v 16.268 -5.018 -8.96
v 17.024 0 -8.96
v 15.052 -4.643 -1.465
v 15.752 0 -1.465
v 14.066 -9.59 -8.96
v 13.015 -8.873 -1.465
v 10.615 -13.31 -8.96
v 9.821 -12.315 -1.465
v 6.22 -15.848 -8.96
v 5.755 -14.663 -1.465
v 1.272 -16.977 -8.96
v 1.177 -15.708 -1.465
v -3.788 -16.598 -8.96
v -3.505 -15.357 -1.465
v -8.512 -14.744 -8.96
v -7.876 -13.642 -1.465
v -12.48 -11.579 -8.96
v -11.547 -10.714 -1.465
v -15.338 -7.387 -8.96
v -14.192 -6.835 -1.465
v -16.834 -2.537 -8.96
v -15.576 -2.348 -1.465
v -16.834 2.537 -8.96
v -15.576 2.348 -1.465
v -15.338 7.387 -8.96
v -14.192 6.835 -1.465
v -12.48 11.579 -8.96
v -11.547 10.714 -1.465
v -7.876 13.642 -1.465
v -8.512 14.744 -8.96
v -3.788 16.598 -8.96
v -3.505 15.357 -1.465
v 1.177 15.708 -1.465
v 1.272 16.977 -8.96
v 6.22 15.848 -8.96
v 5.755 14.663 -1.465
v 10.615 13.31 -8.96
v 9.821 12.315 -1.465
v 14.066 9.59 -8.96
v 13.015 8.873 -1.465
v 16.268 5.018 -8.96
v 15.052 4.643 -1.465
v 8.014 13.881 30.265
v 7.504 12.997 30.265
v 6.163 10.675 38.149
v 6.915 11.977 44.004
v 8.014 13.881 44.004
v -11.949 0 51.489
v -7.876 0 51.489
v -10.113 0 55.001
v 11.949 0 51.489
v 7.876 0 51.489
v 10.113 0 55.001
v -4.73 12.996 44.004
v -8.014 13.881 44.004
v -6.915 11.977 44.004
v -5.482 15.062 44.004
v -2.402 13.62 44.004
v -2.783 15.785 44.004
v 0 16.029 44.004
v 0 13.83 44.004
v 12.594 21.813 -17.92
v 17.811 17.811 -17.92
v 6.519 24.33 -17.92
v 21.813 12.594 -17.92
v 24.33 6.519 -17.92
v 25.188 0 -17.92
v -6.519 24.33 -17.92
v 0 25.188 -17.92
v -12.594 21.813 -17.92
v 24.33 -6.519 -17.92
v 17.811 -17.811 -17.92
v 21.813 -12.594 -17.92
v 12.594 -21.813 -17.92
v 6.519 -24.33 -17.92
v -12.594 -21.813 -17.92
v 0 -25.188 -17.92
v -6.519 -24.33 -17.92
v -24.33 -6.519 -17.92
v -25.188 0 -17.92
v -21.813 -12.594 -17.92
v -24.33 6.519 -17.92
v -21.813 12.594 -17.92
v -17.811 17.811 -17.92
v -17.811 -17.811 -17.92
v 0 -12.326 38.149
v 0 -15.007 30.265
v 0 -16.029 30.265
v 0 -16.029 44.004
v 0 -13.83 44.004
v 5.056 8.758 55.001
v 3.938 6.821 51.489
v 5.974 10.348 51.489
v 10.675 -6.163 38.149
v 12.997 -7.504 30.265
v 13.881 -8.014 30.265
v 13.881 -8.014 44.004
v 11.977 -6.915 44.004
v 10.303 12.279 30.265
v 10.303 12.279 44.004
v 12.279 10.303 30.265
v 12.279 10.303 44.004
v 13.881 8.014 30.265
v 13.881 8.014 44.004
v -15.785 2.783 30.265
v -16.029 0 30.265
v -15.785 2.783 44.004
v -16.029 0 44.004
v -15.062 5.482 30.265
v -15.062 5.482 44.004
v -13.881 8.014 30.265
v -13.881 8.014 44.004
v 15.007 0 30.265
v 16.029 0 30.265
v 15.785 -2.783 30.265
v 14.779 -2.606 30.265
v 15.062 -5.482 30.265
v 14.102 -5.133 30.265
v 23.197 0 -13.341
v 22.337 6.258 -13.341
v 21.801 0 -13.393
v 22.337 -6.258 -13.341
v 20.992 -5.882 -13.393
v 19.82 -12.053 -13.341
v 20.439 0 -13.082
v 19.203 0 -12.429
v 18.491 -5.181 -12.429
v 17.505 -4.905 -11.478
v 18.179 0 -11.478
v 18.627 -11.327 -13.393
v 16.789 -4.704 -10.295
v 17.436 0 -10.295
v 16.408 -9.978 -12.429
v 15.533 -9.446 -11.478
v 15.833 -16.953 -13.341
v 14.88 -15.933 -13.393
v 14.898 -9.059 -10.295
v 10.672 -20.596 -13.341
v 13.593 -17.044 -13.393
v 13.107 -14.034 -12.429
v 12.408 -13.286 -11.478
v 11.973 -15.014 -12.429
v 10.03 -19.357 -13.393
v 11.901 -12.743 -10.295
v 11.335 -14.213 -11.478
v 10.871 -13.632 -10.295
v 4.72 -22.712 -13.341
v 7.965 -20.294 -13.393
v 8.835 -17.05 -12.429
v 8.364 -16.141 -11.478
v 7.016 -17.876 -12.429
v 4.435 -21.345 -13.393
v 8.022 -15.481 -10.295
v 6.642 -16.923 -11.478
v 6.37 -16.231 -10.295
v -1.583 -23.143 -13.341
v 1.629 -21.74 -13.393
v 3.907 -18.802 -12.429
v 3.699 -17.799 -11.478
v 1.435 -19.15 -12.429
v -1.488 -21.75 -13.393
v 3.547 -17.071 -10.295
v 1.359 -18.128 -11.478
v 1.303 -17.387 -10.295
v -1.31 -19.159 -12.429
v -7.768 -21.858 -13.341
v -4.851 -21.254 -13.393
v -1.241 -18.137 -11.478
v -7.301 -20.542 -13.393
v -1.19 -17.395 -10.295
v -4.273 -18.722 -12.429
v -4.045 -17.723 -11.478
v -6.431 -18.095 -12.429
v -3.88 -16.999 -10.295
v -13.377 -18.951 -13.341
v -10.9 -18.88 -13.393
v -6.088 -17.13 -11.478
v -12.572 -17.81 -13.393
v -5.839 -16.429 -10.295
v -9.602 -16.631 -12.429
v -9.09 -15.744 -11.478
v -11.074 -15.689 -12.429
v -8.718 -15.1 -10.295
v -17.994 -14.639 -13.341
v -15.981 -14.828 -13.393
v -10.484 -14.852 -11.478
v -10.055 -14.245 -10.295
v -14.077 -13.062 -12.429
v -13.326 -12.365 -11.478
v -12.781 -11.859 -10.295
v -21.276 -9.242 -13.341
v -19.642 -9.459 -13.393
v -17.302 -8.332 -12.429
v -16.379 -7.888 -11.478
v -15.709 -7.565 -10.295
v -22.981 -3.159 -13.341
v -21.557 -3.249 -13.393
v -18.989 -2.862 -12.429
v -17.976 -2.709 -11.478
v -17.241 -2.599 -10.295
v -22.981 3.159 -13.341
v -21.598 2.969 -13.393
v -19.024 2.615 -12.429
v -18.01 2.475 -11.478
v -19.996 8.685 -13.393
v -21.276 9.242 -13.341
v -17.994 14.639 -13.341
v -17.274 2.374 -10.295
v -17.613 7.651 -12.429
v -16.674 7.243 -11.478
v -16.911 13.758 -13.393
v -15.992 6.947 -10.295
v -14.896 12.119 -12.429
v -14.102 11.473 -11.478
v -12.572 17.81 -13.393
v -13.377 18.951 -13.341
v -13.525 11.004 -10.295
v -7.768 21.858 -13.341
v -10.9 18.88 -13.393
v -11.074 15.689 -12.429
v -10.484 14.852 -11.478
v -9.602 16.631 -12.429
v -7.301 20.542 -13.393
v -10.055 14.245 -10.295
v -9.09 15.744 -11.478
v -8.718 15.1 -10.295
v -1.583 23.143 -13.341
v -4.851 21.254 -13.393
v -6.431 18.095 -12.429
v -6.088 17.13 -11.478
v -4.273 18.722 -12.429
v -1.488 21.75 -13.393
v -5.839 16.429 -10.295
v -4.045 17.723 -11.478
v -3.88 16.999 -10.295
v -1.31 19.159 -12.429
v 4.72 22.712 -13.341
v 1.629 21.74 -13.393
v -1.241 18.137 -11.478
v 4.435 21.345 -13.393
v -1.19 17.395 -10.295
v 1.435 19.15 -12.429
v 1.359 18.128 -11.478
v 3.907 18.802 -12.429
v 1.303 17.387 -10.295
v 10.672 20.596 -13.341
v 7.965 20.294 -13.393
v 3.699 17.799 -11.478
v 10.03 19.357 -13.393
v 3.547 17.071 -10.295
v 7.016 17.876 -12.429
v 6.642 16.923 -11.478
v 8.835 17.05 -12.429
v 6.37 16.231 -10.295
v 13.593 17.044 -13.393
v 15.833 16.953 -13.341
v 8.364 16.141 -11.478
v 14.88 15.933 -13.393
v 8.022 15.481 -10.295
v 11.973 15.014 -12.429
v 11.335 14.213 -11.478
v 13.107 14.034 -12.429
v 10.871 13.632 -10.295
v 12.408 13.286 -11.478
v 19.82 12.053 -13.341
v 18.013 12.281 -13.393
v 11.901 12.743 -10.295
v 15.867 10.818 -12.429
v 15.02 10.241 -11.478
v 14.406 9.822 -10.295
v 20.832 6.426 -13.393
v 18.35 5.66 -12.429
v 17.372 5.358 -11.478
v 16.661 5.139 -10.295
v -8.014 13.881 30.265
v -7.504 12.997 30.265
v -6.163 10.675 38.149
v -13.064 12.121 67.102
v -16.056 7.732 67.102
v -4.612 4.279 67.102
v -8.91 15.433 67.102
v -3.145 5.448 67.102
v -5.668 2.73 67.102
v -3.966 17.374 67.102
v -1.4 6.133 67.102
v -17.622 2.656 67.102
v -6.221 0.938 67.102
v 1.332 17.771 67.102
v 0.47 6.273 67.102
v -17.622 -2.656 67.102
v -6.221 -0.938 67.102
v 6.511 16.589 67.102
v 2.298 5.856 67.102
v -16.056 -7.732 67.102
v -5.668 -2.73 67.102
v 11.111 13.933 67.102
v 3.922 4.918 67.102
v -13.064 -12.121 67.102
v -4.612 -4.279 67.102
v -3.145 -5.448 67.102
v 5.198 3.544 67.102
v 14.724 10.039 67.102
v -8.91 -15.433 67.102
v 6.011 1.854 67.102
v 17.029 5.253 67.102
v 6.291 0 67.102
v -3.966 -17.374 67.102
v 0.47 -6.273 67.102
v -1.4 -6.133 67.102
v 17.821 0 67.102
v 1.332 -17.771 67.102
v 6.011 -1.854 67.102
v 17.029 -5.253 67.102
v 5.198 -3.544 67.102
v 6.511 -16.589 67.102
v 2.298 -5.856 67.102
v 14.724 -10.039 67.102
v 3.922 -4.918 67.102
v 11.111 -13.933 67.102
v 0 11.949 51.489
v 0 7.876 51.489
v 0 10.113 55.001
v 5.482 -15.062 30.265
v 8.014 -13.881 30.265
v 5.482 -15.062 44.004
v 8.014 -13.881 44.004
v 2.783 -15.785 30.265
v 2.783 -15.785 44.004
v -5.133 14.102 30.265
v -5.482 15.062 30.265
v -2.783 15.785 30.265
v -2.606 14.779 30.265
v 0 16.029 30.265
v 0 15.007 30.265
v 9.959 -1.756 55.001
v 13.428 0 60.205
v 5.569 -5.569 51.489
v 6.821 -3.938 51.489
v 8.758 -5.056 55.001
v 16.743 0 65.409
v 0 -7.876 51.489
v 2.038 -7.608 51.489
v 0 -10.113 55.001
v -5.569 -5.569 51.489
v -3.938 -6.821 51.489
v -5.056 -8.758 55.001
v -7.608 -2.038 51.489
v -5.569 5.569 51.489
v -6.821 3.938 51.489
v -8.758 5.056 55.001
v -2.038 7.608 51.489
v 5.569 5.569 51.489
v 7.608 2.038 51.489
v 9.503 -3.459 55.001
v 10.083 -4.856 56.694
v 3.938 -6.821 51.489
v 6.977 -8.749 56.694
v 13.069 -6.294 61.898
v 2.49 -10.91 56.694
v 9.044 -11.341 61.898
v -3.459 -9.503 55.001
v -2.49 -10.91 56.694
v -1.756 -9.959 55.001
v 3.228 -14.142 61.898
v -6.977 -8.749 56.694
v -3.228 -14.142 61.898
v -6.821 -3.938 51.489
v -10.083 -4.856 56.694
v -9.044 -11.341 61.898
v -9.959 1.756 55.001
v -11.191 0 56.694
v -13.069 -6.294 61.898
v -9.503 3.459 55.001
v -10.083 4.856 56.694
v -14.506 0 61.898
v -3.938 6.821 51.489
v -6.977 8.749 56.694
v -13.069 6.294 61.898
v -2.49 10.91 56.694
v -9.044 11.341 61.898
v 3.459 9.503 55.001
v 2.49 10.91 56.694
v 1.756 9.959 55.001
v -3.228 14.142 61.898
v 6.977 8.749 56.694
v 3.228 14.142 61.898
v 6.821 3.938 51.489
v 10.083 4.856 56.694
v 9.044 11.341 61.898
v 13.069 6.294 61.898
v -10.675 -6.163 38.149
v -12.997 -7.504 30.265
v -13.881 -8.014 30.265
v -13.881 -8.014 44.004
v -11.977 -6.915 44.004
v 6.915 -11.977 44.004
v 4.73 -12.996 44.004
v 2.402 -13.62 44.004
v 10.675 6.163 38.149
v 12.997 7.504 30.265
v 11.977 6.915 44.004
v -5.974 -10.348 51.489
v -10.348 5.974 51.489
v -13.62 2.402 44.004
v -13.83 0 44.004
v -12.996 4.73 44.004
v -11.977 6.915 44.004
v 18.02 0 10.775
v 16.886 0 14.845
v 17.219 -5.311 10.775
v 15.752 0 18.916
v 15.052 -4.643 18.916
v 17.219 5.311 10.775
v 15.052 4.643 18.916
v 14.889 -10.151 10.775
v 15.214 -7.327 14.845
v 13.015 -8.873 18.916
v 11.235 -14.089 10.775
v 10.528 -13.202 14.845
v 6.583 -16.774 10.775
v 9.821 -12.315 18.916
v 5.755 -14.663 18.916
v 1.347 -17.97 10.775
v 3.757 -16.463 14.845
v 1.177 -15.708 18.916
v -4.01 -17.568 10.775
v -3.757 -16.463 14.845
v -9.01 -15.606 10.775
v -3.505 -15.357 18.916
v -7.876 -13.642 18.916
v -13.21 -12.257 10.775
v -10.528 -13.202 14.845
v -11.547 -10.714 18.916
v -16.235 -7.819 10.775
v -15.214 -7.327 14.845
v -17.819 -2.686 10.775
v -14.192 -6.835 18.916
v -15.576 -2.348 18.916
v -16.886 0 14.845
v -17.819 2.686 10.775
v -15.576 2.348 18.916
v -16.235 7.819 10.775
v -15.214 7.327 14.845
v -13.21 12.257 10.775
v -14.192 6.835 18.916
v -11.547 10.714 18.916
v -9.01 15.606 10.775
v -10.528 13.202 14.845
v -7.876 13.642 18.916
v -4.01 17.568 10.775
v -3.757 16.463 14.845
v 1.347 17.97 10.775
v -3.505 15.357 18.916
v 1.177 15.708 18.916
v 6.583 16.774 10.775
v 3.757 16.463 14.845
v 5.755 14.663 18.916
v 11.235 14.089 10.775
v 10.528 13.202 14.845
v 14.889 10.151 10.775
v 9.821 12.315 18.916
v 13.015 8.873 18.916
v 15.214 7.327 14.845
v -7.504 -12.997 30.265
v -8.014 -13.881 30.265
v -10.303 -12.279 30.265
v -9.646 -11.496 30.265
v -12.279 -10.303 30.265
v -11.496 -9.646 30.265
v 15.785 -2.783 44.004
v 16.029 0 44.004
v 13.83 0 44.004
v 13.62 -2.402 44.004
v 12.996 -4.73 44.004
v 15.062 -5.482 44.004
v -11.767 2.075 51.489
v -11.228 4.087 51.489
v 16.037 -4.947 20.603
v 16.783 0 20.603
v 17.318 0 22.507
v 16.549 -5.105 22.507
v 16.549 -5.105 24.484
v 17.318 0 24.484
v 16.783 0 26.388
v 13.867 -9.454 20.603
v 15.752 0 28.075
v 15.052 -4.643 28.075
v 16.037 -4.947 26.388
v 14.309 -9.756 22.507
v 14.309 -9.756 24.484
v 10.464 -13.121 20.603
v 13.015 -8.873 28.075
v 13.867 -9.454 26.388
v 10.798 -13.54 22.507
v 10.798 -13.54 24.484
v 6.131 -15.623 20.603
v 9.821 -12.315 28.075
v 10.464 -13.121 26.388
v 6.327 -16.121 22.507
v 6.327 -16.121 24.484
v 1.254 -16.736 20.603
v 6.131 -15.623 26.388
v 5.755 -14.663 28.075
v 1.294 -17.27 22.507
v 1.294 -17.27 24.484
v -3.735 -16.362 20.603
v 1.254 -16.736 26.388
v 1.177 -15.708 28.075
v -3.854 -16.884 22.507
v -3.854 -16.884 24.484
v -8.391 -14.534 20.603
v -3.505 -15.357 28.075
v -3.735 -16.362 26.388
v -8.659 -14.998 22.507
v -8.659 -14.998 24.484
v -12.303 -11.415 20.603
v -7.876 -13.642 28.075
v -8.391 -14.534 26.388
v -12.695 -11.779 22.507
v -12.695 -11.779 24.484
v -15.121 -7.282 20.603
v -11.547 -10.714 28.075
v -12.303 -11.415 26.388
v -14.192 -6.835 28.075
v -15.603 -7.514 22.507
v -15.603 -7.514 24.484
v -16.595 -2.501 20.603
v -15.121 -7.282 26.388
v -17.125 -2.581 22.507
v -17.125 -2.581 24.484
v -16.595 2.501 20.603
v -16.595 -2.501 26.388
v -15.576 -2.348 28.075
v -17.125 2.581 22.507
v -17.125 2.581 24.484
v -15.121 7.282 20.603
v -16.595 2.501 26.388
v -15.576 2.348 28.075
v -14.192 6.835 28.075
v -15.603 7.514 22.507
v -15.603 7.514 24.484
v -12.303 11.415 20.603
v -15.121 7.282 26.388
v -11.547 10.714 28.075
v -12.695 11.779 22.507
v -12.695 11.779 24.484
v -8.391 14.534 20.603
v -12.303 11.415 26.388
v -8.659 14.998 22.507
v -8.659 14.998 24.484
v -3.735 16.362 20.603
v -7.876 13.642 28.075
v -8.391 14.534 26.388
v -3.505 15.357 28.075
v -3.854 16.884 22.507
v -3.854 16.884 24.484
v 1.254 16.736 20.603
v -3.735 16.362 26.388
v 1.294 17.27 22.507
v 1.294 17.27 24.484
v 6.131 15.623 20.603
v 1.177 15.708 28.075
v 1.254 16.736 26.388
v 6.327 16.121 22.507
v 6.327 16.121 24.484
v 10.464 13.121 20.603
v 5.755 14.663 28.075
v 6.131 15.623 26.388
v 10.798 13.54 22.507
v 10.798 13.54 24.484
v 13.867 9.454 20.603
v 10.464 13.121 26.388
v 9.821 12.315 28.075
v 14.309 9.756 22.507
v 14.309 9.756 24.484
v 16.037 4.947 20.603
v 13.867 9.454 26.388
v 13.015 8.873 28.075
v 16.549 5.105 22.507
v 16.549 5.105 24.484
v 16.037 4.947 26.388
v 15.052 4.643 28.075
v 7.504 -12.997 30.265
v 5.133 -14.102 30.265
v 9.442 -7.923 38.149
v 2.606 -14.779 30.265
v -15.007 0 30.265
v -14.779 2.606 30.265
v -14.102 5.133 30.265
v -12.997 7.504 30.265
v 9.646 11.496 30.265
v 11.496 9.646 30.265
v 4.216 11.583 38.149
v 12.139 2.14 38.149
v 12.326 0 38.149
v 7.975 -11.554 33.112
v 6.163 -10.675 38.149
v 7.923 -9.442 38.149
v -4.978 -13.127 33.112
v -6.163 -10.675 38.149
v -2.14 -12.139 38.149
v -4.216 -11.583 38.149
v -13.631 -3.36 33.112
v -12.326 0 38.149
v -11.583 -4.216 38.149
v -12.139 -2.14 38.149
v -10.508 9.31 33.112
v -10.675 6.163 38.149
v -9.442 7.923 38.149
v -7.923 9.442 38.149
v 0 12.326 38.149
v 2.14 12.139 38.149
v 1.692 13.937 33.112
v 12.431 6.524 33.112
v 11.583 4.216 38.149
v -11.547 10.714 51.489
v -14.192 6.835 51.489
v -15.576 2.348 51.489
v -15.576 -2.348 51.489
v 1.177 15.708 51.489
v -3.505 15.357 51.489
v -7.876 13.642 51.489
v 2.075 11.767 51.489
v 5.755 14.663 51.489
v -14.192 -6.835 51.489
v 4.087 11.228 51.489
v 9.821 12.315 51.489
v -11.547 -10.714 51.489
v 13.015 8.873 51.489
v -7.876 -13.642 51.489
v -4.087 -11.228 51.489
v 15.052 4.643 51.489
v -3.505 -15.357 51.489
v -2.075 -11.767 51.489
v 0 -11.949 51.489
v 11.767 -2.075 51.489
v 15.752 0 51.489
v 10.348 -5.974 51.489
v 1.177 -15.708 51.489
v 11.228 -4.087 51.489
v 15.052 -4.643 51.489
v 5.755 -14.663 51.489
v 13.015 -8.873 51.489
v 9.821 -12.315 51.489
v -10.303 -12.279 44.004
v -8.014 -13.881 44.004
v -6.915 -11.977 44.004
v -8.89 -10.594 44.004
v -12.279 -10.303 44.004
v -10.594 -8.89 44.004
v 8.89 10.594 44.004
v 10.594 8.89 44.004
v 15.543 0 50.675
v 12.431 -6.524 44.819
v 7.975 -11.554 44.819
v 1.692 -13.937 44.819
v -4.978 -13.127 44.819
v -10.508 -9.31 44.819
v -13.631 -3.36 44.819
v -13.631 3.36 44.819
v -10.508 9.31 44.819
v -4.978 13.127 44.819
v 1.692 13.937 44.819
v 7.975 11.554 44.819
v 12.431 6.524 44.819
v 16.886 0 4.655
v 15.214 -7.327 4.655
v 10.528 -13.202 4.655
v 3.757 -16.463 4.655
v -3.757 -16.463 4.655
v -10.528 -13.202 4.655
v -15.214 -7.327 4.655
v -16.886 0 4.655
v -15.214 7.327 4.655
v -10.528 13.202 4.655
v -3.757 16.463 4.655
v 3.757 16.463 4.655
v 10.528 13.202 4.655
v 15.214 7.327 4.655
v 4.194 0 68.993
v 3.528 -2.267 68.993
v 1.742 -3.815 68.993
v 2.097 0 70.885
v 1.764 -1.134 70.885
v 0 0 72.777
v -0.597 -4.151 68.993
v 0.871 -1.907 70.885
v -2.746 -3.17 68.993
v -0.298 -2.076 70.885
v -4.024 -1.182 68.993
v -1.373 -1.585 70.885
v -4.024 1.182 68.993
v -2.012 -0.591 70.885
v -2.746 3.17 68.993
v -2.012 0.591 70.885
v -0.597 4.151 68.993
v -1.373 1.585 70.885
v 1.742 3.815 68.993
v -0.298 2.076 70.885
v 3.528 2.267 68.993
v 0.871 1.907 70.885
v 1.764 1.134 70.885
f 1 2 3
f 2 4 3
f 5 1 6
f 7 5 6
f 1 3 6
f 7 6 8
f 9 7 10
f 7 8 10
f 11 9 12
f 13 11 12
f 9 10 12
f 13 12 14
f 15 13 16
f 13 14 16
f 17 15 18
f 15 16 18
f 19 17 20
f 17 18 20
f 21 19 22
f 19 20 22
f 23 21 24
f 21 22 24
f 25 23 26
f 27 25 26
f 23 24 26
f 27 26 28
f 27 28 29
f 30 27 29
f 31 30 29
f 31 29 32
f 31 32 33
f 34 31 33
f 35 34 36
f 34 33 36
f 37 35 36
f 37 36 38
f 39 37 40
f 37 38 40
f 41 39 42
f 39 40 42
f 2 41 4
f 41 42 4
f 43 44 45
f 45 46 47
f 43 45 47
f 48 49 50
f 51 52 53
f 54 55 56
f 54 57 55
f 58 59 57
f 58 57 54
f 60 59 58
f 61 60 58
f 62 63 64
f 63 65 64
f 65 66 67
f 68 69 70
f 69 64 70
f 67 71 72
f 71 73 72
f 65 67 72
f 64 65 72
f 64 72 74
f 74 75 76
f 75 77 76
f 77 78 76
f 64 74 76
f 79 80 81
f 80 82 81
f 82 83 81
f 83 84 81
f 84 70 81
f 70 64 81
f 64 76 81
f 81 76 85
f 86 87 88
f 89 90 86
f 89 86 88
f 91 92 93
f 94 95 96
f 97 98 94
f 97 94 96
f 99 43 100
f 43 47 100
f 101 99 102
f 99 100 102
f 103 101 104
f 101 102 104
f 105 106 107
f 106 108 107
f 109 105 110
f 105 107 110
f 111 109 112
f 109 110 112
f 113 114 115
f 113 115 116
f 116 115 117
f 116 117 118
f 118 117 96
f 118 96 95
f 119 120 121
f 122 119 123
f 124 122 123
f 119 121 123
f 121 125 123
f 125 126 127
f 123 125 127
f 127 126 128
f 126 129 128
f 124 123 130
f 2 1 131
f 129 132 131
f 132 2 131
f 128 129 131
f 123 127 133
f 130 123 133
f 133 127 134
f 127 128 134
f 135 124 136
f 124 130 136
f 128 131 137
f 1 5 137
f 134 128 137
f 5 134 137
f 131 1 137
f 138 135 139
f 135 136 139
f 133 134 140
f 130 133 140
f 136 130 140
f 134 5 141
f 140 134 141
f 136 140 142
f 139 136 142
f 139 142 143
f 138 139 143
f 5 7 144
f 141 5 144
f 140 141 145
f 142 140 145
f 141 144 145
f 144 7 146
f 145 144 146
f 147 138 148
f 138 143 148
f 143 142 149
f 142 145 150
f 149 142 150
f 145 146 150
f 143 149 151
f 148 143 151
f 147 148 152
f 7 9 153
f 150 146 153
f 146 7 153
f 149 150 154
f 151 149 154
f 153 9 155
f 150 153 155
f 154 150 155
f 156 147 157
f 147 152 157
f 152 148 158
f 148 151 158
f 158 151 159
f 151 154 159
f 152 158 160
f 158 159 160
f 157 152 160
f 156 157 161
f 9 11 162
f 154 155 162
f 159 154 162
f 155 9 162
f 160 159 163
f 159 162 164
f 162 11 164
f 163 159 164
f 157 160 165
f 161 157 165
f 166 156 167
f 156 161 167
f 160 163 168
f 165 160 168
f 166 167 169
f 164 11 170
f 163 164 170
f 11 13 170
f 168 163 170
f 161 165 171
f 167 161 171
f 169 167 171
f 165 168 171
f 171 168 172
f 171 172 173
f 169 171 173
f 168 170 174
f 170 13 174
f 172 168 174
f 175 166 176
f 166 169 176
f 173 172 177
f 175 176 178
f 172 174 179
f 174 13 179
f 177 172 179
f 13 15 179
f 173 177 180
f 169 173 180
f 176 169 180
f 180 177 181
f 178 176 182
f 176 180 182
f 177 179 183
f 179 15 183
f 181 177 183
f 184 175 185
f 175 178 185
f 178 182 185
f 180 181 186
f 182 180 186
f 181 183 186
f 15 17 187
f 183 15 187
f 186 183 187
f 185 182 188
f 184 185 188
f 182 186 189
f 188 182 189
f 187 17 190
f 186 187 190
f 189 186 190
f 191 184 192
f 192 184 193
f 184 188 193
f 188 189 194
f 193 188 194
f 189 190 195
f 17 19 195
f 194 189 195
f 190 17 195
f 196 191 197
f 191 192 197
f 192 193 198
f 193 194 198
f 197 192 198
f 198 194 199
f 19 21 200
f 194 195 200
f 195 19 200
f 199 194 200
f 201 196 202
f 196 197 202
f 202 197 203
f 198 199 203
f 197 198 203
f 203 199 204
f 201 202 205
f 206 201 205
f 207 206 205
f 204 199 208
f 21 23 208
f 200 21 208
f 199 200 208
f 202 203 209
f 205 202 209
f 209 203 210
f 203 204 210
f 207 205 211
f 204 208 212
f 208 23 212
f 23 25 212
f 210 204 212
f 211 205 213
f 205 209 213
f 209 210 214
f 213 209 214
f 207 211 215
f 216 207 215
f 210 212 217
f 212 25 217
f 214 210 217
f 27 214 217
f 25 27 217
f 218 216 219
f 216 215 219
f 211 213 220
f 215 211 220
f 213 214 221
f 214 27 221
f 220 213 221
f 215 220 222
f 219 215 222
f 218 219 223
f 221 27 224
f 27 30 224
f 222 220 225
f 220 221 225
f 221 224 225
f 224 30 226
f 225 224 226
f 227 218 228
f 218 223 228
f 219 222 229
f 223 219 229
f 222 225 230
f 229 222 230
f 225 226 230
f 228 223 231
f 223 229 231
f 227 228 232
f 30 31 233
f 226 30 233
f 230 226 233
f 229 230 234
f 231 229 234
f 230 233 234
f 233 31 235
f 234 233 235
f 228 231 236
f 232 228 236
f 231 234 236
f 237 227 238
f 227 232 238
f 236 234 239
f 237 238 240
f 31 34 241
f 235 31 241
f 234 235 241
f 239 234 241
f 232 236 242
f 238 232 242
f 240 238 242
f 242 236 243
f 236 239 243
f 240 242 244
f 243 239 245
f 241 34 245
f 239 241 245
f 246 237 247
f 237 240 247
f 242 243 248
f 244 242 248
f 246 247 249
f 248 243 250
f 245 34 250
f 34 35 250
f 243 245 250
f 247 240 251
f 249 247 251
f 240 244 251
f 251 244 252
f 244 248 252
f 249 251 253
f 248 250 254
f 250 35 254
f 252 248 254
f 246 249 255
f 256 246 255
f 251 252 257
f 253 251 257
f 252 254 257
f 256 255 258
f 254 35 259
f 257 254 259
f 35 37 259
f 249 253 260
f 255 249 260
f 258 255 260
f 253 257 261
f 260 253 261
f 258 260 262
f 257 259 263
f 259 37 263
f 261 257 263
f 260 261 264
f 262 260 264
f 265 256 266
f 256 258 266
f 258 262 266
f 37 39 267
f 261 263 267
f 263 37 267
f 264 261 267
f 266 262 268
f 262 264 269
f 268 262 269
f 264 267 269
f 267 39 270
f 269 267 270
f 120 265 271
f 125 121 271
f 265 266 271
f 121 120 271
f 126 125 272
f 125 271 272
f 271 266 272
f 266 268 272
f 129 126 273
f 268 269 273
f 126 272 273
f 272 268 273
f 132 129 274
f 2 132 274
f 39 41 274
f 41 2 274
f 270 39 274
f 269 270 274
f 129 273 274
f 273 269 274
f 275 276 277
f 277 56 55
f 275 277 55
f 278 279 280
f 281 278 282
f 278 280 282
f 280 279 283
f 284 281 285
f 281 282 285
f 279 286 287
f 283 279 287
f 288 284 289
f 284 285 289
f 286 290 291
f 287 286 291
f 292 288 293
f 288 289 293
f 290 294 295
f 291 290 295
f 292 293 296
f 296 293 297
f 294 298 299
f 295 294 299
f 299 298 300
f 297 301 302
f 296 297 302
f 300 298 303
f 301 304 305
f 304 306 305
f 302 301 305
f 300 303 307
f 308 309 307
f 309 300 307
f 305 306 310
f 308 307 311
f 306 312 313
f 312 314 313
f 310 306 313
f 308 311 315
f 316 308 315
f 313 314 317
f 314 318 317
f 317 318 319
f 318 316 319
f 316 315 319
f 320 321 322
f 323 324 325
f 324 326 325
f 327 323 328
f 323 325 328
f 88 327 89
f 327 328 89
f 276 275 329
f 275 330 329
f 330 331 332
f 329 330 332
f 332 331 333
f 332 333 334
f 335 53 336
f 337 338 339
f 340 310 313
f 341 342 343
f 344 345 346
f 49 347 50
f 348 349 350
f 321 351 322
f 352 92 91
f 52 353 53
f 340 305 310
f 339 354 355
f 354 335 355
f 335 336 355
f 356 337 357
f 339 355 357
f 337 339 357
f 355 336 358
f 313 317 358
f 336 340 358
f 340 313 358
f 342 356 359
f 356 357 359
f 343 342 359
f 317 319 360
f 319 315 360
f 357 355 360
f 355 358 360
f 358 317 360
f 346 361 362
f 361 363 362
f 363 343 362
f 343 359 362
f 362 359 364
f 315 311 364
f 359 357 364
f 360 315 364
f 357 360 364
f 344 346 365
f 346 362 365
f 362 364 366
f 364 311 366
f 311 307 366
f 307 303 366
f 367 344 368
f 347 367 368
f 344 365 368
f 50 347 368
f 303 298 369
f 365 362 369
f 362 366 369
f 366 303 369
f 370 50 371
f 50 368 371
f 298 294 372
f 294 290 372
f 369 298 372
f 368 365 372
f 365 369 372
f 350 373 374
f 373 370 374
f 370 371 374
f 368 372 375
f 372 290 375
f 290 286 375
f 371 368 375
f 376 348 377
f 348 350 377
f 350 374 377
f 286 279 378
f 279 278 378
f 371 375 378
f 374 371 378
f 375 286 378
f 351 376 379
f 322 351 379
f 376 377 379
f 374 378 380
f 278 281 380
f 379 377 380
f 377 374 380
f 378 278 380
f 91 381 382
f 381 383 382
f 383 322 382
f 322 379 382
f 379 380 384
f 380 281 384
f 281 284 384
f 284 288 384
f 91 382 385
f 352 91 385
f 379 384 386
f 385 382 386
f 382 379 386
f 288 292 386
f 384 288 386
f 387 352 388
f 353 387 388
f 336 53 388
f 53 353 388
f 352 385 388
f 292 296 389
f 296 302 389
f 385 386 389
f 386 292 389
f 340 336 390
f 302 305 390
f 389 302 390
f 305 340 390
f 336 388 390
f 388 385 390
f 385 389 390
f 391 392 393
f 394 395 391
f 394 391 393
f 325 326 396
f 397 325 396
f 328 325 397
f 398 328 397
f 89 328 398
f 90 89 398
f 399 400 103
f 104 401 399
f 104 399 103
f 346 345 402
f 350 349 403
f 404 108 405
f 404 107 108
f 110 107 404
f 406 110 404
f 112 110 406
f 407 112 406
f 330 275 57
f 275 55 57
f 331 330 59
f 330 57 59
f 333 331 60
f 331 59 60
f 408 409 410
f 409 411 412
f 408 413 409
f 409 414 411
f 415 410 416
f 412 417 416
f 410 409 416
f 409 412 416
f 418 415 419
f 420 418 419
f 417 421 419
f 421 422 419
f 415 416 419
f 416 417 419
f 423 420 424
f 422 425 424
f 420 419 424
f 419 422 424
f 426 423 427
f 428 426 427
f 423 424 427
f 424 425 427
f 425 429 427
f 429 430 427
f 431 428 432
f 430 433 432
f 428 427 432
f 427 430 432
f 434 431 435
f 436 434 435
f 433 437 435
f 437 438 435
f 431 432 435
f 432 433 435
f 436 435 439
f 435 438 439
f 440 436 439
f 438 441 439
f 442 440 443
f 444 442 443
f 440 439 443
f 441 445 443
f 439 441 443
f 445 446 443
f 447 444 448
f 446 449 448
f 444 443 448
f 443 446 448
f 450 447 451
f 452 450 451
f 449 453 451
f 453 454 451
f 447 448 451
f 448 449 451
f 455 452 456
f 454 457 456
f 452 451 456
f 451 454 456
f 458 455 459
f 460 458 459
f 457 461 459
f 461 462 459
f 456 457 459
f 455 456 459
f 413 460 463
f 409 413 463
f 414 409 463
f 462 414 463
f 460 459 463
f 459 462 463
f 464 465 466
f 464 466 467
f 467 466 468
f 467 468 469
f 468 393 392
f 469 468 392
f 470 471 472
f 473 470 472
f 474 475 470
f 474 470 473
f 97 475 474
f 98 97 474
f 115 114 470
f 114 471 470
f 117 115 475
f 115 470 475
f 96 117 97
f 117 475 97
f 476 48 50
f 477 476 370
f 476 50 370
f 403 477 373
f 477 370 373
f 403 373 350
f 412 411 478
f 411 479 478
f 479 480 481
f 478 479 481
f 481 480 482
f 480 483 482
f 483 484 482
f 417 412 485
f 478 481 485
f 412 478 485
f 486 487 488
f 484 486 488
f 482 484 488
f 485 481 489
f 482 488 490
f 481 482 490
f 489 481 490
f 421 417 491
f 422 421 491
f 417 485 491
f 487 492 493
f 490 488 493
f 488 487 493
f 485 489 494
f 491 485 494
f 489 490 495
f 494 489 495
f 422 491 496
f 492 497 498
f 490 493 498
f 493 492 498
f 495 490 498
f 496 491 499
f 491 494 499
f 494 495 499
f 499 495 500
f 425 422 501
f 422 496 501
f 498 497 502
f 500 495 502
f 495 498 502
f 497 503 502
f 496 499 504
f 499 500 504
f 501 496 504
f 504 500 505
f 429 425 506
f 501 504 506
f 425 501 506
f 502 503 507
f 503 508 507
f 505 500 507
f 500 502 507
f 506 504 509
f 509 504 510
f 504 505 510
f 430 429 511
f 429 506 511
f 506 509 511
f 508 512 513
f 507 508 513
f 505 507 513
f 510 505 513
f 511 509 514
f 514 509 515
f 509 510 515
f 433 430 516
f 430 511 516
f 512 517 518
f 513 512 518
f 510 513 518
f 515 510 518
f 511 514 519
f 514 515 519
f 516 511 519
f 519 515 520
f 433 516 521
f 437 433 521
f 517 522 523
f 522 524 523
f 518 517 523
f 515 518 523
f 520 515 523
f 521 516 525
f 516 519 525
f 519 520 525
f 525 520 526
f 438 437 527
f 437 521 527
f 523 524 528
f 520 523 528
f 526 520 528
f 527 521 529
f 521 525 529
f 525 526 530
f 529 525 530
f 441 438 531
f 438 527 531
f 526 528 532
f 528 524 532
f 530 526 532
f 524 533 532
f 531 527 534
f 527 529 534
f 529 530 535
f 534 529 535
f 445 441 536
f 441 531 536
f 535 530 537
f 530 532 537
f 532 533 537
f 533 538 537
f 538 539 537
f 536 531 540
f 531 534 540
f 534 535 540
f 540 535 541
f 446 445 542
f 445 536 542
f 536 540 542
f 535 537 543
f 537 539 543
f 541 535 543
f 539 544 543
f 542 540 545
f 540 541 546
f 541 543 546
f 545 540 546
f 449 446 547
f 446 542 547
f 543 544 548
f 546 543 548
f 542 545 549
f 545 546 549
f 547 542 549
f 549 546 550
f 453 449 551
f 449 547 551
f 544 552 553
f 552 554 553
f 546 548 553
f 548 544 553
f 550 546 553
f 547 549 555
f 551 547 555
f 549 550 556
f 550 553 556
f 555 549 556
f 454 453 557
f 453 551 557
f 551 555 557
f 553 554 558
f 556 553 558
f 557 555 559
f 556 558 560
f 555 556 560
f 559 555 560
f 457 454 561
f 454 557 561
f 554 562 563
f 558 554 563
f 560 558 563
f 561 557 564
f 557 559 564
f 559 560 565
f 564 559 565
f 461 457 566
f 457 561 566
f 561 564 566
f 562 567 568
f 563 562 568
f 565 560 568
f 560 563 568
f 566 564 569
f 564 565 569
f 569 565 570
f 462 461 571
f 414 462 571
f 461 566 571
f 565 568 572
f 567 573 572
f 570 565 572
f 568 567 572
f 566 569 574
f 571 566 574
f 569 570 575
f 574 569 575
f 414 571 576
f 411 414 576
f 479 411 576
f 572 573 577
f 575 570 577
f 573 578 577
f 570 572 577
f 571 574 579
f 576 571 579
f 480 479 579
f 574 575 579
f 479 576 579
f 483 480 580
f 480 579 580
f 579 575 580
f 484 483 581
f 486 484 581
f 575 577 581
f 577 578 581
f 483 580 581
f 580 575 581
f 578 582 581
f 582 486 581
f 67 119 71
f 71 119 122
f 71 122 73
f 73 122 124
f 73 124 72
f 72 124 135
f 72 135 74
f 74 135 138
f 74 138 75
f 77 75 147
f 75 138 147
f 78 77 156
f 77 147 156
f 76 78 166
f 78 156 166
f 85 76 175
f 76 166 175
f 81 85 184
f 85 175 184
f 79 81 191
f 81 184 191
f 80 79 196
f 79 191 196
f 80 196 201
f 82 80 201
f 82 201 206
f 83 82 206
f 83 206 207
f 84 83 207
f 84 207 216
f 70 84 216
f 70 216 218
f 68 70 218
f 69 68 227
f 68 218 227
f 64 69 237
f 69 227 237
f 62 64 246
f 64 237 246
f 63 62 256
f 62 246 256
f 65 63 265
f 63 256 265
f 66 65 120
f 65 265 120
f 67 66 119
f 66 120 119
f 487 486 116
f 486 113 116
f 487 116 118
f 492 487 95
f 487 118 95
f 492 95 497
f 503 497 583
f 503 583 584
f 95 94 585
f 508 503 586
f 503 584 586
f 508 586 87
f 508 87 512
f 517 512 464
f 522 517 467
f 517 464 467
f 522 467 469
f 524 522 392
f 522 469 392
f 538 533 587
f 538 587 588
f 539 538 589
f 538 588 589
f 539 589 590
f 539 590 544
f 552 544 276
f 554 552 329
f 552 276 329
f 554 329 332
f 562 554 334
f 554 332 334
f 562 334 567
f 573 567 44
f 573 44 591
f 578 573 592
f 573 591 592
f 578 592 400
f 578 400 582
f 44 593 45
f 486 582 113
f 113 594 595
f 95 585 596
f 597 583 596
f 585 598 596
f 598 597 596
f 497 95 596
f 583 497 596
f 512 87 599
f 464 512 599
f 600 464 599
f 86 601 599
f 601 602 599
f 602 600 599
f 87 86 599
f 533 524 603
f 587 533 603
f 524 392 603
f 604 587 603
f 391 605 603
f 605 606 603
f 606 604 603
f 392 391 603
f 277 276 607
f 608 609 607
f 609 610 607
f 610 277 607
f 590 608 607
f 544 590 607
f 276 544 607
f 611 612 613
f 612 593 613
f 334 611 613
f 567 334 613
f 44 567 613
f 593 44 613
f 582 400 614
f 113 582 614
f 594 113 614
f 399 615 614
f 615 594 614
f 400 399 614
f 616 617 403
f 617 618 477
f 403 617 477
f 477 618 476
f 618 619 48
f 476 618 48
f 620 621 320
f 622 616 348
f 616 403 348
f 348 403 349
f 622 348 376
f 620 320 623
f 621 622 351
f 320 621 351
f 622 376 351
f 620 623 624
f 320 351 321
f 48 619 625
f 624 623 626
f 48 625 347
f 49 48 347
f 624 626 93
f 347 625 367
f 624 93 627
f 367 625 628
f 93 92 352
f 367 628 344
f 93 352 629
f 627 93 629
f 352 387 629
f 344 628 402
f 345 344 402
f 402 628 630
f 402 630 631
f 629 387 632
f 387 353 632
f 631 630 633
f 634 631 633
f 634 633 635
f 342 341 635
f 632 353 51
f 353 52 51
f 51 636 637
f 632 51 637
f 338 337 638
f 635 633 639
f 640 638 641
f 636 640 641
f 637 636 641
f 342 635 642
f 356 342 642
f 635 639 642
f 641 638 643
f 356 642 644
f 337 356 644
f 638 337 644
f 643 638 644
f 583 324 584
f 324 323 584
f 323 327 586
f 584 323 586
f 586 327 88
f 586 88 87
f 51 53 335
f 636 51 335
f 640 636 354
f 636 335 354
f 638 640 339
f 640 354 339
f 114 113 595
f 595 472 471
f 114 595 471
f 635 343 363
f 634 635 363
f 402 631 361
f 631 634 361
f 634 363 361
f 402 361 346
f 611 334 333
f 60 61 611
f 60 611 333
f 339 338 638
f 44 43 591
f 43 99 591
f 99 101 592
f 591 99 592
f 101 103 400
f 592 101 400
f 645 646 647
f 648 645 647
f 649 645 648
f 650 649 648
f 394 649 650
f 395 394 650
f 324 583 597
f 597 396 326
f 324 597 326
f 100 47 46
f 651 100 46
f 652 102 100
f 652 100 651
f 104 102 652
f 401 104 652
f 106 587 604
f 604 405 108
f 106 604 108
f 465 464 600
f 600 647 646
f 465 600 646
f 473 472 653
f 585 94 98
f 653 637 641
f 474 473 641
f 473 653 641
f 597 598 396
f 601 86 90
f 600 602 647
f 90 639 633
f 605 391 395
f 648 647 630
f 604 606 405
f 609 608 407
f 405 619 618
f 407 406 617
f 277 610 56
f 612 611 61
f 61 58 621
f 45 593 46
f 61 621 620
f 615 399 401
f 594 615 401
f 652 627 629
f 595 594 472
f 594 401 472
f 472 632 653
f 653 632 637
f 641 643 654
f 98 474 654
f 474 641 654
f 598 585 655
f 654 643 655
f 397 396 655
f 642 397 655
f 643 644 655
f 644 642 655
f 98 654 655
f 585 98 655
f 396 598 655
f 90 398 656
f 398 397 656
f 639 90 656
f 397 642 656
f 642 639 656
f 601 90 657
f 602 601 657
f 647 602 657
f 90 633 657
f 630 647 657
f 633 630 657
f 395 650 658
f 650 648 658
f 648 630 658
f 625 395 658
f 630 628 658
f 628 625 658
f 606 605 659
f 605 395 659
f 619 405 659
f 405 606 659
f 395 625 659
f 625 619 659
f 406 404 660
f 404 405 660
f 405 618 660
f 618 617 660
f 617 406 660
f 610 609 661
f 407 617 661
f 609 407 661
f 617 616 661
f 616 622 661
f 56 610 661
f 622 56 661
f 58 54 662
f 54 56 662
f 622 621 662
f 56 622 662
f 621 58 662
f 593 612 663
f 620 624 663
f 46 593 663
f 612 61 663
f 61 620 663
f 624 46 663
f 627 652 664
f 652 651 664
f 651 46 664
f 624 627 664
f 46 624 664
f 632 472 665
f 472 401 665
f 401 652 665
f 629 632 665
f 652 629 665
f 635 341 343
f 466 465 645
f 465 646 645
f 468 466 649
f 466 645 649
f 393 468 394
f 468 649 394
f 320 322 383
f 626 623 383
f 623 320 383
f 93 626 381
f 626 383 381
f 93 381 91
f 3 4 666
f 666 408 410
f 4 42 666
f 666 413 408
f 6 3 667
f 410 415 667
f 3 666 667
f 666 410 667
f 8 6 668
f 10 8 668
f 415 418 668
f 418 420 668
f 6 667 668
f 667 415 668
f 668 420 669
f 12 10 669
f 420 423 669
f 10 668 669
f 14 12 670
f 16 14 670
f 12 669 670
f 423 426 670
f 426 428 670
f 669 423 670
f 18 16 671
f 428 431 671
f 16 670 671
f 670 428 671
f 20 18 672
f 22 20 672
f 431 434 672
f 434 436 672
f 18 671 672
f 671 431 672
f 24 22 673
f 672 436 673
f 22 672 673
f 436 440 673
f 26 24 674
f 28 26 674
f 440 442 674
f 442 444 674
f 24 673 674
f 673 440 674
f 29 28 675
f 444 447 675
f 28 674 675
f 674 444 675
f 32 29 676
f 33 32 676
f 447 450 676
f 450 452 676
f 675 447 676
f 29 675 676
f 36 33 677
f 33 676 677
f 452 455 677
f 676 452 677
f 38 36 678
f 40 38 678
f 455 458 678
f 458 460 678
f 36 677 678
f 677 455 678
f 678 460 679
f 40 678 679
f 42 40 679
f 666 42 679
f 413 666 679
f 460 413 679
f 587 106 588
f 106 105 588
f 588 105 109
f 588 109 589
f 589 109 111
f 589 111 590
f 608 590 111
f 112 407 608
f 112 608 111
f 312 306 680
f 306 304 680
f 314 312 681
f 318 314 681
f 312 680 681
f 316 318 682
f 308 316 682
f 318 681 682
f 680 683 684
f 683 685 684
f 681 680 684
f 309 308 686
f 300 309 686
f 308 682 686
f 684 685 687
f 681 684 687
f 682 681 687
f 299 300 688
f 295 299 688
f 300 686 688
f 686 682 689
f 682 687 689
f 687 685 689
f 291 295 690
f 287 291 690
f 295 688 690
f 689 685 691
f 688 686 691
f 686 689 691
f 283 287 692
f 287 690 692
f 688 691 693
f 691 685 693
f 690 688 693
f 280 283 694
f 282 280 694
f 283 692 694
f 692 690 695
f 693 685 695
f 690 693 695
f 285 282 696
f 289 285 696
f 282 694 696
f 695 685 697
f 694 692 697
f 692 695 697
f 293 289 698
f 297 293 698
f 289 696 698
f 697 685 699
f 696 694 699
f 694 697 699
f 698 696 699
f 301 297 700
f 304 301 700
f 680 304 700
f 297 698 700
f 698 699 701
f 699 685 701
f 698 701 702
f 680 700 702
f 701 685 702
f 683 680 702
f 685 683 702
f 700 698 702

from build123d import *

# Parameters (mm, degrees)
F2_W            = 4.3805325404
F2_H            = 13.738937676
F3_ANGLE        = 30
F3_COPIES_COUNT = 6
F5_ANGLE        = 30
F5_COPIES_COUNT = 4


# Not quite as in the source:
# - a pattern or mirror of a feature is missing from the dataset's text; its kind, count and spacing are read off the source's solid


with BuildPart() as f1:
    # F0 (on Front) → F1 (revolve)
    with BuildSketch(Plane.XZ):
        Polygon((0, 72.776556015), (0, 67.1017691493), (6.2909605913, 67.1017691493), align=None)
        Polygon((0, 67.1017691493), (0, 51.4894537628), (7.8760384344, 51.4894537628), (17.8207978606, 67.1017691493), (6.2909605913, 67.1017691493), align=None)
        with BuildLine():
            Line((0, 51.4894537628), (0, -17.9203543812))
            Line((0, -17.9203543812), (25.1880511642, -17.9203543812))
            Line((25.1880511642, -17.9203543812), (23.1969021261, -13.3407087997))
            ThreePointArc((23.1969021261, -13.3407087997), (19.2033042996, -12.428933787), (17.024340108, -8.9601771906))
            Line((17.024340108, -8.9601771906), (15.7520768689, -1.4651455679))
            Line((15.7520768689, -1.4651455679), (18.0199127644, 10.7748573646))
            Line((18.0199127644, 10.7748573646), (15.7520768689, 18.9159307629))
            ThreePointArc((15.7520768689, 18.9159307629), (17.3860110627, 23.4955772758), (15.7520768689, 28.0752237886))
            Line((15.7520768689, 28.0752237886), (12.3262992129, 38.1487458944))
            Line((12.3262992129, 38.1487458944), (15.7520768689, 51.4894537628))
            Line((15.7520768689, 51.4894537628), (7.8760384344, 51.4894537628))
            Line((7.8760384344, 51.4894537628), (0, 51.4894537628))
        make_face()
    revolve(axis=Axis((0, 0, 27.4281008169), (0, 0, -1)))

    # F2 (on Front) → F3 (revolve)
    with BuildSketch(Plane.XZ):
        with Locations((13.8384955935, 37.1349565685)):
            Rectangle(F2_W, F2_H)
    f3 = revolve(axis=Axis((0, 0, 27.4281008169), (0, 0, -1)), revolution_arc=F3_ANGLE)

    # F3_copies: F3 ×6 about axis
    f3_copies_axis = Axis((0, 0, 0), (0, 0, 1))
    for i in range(1, F3_COPIES_COUNT):
        add(f3.rotate(f3_copies_axis, i * 360 / F3_COPIES_COUNT))

    # F4 (on Front) → F5 (revolve)
    with BuildSketch(Plane.XZ):
        Polygon((12.8429187462, 49.7787632048), (8.263274096, 58.5398264229), (6.6703548655, 49.7787632048), align=None)
    f5 = revolve(axis=Axis((0, 0, 27.4281008169), (0, 0, -1)), revolution_arc=F5_ANGLE)

    # F5_copies: F5 ×4 about axis
    f5_copies_axis = Axis((0, 0, 0), (0, 0, 1))
    for i in range(1, F5_COPIES_COUNT):
        add(f5.rotate(f5_copies_axis, i * 360 / F5_COPIES_COUNT))


solid = f1.part
